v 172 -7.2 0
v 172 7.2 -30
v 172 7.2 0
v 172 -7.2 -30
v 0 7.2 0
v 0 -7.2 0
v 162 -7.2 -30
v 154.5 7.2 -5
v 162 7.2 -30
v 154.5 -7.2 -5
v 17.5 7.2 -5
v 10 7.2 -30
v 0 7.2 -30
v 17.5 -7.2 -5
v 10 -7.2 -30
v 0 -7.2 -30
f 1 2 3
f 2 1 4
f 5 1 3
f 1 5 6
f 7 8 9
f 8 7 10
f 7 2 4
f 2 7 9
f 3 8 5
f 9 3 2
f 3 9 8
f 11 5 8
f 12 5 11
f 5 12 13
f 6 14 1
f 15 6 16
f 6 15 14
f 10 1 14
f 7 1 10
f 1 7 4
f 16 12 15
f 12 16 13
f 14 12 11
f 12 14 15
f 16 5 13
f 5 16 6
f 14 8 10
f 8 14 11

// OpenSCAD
include <../../lib/relativity.scad/relativity.scad>

// printing infill: 10%

d = 45;
center_distance = 172;
h = 65;
bar_width = 15;
bar_height = 5;

$fn=30;

module X(d, h) {
  hull()
  translated(center_distance/2*x, n=[-1:1]) rod(d=d, h=h, anchor=bottom);
}

// differed("hole", "not(hole)") {
//   X(d+5, 8);
//   class("hole") translated(3*z) X(d, 6);

//   mirrored(x) translated(center_distance/2*x) {
//     rod(d=d+5, h=h, anchor=top);
//     // low infill, use hole wall to strengthen
//     rotated(30*z, n=[1:12]) translated((d/2-5)*x) rod(d=3, h=h-1, anchor=top, $class="hole", $fn=6);
//   } 
// }

module pillar() {
  differed("hole", "not(hole)") {
    rod(d=d+5, h=h, anchor=top);
    rod(d=d+5, h=5, anchor=bottom);
    rod(d=d, h=5, anchor=bottom, $class="hole")
      align(bottom) {
        // low infill, use hole wall to strengthen
        rotated(36*z, n=[1:9]) 
          translated((d/2-5)*x - 1*z) rod(d=3, h=h-2, anchor=top, $class="hole", $fn=6);
        box([d+10, bar_width, 10], anchor=-x-z, $class="hole");
        box([d+10, bar_width, bar_height], anchor=-x+z, $class="hole");
      }
  }
}

module bar_end(width) {
  hull() {
    box([10, width, 30], anchor=-x+z);
    box([d/2-5, width, bar_height], anchor=-x+z);
  }
}

module bar() {
  mirrored(x) translated(-center_distance/2*x)
    bar_end(bar_width-0.6);
  box([center_distance, bar_width-0.6, bar_height], anchor=top);
}

// difference() {
//   pillar();
//   bar_end(bar_width);
// }

translated(center_distance/2*x) color("red") bar();
